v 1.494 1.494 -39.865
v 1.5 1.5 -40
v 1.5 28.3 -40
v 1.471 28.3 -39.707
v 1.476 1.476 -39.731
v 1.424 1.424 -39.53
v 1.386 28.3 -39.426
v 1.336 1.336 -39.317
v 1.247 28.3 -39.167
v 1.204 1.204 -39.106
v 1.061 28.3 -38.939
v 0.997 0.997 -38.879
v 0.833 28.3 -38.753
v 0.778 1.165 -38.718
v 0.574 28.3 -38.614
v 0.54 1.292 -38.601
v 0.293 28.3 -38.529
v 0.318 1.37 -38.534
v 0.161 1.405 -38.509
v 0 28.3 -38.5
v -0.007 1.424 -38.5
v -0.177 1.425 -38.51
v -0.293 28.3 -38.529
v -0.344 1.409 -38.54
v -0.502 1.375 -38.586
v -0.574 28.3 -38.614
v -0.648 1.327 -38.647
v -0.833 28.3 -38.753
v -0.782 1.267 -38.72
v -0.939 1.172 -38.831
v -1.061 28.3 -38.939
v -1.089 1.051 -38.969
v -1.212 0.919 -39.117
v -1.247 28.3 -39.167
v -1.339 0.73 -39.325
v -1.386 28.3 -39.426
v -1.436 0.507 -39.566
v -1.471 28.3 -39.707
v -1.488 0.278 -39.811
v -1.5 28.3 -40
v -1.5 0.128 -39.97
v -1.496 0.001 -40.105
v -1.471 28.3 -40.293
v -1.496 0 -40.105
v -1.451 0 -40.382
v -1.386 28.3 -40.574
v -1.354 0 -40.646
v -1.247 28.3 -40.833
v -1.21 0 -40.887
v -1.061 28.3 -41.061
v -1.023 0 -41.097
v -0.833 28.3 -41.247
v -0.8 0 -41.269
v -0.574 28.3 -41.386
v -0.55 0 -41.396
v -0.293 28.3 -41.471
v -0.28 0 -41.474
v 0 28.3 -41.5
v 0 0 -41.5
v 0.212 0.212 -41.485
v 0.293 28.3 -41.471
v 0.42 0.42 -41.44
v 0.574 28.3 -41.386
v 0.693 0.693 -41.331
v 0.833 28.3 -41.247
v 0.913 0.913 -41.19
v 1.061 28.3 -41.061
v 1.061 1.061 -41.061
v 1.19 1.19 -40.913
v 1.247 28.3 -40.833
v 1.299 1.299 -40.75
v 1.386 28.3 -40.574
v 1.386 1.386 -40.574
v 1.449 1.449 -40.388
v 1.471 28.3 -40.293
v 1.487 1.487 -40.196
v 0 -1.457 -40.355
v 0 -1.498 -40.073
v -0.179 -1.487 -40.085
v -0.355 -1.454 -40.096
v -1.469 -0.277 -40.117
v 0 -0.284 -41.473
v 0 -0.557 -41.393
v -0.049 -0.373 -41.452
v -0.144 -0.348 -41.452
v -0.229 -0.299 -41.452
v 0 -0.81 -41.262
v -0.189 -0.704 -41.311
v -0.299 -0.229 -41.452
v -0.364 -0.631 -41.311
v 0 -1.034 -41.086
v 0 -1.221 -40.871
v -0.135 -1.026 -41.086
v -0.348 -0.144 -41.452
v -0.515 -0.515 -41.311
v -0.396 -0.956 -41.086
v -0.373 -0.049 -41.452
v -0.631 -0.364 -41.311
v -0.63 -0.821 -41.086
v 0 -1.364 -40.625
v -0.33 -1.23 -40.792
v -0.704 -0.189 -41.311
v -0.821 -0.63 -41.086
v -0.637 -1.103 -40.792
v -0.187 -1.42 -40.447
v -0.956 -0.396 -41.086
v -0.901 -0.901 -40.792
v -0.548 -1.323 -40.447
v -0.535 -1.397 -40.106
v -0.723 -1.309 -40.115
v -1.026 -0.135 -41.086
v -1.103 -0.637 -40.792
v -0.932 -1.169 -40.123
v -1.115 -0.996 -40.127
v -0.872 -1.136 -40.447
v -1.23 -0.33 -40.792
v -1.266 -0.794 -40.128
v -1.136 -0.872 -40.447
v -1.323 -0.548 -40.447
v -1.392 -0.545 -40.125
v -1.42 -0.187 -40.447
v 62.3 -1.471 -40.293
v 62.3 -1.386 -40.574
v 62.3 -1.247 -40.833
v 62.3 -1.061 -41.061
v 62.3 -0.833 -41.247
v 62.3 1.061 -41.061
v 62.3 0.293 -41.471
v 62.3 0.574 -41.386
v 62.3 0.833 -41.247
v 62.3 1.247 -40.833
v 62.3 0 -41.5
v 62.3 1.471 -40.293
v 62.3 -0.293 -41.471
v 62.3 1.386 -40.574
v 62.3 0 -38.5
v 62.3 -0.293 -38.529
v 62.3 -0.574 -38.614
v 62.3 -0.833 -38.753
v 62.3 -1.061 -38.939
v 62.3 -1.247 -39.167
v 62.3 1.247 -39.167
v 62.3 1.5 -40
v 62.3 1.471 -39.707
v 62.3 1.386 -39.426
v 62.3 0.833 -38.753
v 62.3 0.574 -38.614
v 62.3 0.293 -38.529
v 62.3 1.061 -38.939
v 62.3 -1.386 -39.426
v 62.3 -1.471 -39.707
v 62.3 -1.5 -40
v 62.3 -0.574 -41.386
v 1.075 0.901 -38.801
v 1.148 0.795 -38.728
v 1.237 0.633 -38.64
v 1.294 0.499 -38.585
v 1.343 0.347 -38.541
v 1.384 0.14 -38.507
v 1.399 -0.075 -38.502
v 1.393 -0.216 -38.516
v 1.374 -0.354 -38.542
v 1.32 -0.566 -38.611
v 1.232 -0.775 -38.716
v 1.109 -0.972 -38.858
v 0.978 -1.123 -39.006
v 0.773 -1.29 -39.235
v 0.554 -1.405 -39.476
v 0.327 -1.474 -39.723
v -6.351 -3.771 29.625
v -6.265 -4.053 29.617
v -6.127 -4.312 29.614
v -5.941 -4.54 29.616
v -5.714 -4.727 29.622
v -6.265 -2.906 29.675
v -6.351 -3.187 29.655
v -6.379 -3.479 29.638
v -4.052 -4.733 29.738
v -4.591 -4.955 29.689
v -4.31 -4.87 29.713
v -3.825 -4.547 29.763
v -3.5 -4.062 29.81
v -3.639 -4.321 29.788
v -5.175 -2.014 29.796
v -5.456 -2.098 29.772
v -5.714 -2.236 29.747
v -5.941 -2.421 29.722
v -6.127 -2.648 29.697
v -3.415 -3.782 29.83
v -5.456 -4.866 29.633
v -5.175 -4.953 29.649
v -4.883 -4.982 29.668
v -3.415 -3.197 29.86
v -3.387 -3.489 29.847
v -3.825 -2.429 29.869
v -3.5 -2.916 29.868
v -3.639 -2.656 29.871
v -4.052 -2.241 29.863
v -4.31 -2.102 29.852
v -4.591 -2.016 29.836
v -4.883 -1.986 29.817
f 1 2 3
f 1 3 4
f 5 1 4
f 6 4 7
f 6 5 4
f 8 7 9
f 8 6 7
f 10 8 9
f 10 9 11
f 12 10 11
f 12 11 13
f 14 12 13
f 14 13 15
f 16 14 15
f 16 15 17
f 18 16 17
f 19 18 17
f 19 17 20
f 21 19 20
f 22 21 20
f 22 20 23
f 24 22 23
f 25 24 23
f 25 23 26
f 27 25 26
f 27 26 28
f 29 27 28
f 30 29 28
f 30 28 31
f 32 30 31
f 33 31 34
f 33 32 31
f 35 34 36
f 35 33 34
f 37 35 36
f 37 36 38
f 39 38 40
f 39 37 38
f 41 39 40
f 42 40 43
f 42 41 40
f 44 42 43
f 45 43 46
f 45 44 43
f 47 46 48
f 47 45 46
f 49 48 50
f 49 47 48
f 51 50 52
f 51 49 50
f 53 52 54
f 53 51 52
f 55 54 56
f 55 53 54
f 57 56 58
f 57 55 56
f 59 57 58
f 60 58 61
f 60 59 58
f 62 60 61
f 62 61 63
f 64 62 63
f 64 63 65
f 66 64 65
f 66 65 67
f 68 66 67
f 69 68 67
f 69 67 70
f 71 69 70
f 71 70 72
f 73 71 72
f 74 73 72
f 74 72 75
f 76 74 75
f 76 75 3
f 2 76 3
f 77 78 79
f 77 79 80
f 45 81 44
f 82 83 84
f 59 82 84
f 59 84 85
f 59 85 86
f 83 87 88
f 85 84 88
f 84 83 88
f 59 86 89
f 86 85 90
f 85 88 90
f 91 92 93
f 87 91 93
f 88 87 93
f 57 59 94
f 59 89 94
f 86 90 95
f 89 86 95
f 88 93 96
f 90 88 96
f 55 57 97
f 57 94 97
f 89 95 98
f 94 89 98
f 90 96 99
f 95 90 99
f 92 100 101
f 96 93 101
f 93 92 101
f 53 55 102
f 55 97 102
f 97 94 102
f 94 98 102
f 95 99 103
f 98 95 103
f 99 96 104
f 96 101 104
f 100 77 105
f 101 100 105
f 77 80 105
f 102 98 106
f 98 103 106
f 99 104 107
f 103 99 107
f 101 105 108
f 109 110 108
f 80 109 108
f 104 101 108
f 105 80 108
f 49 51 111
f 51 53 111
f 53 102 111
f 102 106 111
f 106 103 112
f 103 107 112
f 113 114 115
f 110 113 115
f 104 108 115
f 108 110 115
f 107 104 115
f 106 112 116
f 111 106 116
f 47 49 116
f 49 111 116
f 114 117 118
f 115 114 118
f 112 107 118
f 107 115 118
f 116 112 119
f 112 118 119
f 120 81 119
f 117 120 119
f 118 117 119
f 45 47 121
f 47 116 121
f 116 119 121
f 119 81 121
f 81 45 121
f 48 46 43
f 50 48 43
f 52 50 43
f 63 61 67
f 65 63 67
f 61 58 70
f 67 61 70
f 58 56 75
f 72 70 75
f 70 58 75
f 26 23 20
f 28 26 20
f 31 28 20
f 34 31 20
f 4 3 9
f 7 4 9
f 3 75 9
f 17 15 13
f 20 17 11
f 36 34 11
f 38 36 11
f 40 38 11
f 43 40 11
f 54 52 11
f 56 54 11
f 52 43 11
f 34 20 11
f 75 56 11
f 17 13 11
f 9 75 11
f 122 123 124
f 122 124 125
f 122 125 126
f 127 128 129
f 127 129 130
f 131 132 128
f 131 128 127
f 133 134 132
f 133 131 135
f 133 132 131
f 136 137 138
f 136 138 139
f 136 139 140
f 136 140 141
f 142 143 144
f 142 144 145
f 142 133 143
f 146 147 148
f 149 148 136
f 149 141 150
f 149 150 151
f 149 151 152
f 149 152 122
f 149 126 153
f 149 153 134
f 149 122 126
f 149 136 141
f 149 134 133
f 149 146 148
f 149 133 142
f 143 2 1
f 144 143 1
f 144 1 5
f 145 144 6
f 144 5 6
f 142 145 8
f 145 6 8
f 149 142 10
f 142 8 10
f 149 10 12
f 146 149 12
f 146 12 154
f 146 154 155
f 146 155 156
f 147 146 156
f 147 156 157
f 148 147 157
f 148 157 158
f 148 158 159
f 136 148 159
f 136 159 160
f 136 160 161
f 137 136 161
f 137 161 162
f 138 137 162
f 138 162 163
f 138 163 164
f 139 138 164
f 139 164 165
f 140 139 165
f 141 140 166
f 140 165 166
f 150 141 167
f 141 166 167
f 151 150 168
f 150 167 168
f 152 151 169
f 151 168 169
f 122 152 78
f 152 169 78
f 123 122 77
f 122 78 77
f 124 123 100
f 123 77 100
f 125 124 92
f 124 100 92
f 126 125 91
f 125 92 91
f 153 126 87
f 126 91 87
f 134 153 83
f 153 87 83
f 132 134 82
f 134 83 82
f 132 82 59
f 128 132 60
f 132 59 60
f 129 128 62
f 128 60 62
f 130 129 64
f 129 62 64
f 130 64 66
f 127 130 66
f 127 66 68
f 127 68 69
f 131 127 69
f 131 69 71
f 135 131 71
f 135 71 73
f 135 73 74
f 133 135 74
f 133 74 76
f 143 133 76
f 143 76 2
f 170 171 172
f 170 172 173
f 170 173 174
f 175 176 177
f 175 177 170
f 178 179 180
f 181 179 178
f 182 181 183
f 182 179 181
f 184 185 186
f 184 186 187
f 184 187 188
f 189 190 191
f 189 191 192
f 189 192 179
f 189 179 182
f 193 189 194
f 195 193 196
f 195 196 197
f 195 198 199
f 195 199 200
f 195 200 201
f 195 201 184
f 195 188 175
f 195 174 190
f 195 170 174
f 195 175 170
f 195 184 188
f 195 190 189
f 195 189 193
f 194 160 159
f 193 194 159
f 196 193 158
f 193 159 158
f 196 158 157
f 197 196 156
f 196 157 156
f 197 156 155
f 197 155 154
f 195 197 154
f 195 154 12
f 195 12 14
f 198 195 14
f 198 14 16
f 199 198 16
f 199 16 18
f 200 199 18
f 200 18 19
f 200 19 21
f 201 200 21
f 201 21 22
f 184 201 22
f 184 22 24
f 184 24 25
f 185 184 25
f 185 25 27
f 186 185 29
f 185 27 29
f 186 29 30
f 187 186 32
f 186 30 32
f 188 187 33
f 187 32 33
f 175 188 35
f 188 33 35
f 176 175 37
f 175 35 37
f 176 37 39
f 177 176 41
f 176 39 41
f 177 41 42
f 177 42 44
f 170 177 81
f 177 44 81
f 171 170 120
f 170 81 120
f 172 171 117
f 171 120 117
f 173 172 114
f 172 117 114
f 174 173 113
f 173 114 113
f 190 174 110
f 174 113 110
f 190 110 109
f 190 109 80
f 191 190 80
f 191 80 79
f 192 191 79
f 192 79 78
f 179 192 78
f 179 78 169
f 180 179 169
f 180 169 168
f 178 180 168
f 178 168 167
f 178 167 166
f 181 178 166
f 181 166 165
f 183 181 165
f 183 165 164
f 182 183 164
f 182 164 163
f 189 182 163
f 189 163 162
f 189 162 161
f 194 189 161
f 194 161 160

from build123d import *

# Parameters (mm, degrees)
F0_R      = 1.5
F1_DEPTH  = 62.3
F2_R      = 1.5
F3_DEPTH  = 28.3
F5_ANGLE  = 90
F12_R     = 1.5
F13_DEPTH = 70


with BuildPart() as f1:
    # F0 (on Right) → F1 (new body)
    with BuildSketch(Plane.YZ):
        with Locations((0, -40)):
            Circle(F0_R)
    extrude(amount=F1_DEPTH)

    # F2 (on Front) → F3 (join)
    with BuildSketch(Plane.XZ):
        with Locations((0, -40)):
            Circle(F2_R)
    extrude(amount=-F3_DEPTH)

    # F4 (on face) → F5 (revolve)
    with BuildSketch(Plane(origin=(0, 0, 0), x_dir=(0, -1, 0), z_dir=(-1, 0, 0))):
        with BuildLine():
            Line((0, -38.5), (0, -41.5))
            ThreePointArc((0, -41.5), (1.5, -40), (0, -38.5))
        make_face()
    revolve(axis=Axis((0, 0, -40), (0, 0, -1)), revolution_arc=F5_ANGLE)

    # F12 (on face) → F13 (join)
    with BuildSketch(Plane(origin=(2.779995, 1.983642, -39.706263), x_dir=(0.997564, -0.003481, 0.06967), z_dir=(-0.069756, -0.049774, 0.996322))):
        with Locations((-2.786783, -1.995828)):
            Circle(F12_R)
    extrude(amount=F13_DEPTH)


solid = f1.part
